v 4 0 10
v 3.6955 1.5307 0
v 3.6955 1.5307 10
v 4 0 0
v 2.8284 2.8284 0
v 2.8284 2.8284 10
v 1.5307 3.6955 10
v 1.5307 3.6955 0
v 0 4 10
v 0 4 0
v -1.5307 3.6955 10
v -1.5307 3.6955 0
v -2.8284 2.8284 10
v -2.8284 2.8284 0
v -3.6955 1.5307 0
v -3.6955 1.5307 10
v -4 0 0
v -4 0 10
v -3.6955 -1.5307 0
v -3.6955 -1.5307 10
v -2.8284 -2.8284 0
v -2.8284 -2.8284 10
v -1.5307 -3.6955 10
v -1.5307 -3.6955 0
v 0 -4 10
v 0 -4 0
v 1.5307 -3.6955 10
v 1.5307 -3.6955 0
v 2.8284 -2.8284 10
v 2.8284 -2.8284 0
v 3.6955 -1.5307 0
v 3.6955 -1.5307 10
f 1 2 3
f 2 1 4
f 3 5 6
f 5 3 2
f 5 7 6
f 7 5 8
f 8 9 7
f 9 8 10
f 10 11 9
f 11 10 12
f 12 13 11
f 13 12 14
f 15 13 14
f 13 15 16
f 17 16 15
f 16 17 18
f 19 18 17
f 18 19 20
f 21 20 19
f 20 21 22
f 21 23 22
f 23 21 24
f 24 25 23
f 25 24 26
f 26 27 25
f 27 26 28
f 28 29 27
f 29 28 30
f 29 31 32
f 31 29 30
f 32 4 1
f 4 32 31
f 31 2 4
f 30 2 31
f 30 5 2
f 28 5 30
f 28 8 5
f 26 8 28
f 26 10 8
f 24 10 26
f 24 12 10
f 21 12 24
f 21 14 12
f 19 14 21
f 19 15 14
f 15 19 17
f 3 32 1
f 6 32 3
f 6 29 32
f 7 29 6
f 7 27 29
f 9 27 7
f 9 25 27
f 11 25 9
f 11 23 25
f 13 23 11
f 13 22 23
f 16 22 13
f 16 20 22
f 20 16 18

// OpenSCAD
n = 3;
if (n > 5) sphere(10, $fn = 16); else cylinder(h = 10, r = 4, $fn = 16);
